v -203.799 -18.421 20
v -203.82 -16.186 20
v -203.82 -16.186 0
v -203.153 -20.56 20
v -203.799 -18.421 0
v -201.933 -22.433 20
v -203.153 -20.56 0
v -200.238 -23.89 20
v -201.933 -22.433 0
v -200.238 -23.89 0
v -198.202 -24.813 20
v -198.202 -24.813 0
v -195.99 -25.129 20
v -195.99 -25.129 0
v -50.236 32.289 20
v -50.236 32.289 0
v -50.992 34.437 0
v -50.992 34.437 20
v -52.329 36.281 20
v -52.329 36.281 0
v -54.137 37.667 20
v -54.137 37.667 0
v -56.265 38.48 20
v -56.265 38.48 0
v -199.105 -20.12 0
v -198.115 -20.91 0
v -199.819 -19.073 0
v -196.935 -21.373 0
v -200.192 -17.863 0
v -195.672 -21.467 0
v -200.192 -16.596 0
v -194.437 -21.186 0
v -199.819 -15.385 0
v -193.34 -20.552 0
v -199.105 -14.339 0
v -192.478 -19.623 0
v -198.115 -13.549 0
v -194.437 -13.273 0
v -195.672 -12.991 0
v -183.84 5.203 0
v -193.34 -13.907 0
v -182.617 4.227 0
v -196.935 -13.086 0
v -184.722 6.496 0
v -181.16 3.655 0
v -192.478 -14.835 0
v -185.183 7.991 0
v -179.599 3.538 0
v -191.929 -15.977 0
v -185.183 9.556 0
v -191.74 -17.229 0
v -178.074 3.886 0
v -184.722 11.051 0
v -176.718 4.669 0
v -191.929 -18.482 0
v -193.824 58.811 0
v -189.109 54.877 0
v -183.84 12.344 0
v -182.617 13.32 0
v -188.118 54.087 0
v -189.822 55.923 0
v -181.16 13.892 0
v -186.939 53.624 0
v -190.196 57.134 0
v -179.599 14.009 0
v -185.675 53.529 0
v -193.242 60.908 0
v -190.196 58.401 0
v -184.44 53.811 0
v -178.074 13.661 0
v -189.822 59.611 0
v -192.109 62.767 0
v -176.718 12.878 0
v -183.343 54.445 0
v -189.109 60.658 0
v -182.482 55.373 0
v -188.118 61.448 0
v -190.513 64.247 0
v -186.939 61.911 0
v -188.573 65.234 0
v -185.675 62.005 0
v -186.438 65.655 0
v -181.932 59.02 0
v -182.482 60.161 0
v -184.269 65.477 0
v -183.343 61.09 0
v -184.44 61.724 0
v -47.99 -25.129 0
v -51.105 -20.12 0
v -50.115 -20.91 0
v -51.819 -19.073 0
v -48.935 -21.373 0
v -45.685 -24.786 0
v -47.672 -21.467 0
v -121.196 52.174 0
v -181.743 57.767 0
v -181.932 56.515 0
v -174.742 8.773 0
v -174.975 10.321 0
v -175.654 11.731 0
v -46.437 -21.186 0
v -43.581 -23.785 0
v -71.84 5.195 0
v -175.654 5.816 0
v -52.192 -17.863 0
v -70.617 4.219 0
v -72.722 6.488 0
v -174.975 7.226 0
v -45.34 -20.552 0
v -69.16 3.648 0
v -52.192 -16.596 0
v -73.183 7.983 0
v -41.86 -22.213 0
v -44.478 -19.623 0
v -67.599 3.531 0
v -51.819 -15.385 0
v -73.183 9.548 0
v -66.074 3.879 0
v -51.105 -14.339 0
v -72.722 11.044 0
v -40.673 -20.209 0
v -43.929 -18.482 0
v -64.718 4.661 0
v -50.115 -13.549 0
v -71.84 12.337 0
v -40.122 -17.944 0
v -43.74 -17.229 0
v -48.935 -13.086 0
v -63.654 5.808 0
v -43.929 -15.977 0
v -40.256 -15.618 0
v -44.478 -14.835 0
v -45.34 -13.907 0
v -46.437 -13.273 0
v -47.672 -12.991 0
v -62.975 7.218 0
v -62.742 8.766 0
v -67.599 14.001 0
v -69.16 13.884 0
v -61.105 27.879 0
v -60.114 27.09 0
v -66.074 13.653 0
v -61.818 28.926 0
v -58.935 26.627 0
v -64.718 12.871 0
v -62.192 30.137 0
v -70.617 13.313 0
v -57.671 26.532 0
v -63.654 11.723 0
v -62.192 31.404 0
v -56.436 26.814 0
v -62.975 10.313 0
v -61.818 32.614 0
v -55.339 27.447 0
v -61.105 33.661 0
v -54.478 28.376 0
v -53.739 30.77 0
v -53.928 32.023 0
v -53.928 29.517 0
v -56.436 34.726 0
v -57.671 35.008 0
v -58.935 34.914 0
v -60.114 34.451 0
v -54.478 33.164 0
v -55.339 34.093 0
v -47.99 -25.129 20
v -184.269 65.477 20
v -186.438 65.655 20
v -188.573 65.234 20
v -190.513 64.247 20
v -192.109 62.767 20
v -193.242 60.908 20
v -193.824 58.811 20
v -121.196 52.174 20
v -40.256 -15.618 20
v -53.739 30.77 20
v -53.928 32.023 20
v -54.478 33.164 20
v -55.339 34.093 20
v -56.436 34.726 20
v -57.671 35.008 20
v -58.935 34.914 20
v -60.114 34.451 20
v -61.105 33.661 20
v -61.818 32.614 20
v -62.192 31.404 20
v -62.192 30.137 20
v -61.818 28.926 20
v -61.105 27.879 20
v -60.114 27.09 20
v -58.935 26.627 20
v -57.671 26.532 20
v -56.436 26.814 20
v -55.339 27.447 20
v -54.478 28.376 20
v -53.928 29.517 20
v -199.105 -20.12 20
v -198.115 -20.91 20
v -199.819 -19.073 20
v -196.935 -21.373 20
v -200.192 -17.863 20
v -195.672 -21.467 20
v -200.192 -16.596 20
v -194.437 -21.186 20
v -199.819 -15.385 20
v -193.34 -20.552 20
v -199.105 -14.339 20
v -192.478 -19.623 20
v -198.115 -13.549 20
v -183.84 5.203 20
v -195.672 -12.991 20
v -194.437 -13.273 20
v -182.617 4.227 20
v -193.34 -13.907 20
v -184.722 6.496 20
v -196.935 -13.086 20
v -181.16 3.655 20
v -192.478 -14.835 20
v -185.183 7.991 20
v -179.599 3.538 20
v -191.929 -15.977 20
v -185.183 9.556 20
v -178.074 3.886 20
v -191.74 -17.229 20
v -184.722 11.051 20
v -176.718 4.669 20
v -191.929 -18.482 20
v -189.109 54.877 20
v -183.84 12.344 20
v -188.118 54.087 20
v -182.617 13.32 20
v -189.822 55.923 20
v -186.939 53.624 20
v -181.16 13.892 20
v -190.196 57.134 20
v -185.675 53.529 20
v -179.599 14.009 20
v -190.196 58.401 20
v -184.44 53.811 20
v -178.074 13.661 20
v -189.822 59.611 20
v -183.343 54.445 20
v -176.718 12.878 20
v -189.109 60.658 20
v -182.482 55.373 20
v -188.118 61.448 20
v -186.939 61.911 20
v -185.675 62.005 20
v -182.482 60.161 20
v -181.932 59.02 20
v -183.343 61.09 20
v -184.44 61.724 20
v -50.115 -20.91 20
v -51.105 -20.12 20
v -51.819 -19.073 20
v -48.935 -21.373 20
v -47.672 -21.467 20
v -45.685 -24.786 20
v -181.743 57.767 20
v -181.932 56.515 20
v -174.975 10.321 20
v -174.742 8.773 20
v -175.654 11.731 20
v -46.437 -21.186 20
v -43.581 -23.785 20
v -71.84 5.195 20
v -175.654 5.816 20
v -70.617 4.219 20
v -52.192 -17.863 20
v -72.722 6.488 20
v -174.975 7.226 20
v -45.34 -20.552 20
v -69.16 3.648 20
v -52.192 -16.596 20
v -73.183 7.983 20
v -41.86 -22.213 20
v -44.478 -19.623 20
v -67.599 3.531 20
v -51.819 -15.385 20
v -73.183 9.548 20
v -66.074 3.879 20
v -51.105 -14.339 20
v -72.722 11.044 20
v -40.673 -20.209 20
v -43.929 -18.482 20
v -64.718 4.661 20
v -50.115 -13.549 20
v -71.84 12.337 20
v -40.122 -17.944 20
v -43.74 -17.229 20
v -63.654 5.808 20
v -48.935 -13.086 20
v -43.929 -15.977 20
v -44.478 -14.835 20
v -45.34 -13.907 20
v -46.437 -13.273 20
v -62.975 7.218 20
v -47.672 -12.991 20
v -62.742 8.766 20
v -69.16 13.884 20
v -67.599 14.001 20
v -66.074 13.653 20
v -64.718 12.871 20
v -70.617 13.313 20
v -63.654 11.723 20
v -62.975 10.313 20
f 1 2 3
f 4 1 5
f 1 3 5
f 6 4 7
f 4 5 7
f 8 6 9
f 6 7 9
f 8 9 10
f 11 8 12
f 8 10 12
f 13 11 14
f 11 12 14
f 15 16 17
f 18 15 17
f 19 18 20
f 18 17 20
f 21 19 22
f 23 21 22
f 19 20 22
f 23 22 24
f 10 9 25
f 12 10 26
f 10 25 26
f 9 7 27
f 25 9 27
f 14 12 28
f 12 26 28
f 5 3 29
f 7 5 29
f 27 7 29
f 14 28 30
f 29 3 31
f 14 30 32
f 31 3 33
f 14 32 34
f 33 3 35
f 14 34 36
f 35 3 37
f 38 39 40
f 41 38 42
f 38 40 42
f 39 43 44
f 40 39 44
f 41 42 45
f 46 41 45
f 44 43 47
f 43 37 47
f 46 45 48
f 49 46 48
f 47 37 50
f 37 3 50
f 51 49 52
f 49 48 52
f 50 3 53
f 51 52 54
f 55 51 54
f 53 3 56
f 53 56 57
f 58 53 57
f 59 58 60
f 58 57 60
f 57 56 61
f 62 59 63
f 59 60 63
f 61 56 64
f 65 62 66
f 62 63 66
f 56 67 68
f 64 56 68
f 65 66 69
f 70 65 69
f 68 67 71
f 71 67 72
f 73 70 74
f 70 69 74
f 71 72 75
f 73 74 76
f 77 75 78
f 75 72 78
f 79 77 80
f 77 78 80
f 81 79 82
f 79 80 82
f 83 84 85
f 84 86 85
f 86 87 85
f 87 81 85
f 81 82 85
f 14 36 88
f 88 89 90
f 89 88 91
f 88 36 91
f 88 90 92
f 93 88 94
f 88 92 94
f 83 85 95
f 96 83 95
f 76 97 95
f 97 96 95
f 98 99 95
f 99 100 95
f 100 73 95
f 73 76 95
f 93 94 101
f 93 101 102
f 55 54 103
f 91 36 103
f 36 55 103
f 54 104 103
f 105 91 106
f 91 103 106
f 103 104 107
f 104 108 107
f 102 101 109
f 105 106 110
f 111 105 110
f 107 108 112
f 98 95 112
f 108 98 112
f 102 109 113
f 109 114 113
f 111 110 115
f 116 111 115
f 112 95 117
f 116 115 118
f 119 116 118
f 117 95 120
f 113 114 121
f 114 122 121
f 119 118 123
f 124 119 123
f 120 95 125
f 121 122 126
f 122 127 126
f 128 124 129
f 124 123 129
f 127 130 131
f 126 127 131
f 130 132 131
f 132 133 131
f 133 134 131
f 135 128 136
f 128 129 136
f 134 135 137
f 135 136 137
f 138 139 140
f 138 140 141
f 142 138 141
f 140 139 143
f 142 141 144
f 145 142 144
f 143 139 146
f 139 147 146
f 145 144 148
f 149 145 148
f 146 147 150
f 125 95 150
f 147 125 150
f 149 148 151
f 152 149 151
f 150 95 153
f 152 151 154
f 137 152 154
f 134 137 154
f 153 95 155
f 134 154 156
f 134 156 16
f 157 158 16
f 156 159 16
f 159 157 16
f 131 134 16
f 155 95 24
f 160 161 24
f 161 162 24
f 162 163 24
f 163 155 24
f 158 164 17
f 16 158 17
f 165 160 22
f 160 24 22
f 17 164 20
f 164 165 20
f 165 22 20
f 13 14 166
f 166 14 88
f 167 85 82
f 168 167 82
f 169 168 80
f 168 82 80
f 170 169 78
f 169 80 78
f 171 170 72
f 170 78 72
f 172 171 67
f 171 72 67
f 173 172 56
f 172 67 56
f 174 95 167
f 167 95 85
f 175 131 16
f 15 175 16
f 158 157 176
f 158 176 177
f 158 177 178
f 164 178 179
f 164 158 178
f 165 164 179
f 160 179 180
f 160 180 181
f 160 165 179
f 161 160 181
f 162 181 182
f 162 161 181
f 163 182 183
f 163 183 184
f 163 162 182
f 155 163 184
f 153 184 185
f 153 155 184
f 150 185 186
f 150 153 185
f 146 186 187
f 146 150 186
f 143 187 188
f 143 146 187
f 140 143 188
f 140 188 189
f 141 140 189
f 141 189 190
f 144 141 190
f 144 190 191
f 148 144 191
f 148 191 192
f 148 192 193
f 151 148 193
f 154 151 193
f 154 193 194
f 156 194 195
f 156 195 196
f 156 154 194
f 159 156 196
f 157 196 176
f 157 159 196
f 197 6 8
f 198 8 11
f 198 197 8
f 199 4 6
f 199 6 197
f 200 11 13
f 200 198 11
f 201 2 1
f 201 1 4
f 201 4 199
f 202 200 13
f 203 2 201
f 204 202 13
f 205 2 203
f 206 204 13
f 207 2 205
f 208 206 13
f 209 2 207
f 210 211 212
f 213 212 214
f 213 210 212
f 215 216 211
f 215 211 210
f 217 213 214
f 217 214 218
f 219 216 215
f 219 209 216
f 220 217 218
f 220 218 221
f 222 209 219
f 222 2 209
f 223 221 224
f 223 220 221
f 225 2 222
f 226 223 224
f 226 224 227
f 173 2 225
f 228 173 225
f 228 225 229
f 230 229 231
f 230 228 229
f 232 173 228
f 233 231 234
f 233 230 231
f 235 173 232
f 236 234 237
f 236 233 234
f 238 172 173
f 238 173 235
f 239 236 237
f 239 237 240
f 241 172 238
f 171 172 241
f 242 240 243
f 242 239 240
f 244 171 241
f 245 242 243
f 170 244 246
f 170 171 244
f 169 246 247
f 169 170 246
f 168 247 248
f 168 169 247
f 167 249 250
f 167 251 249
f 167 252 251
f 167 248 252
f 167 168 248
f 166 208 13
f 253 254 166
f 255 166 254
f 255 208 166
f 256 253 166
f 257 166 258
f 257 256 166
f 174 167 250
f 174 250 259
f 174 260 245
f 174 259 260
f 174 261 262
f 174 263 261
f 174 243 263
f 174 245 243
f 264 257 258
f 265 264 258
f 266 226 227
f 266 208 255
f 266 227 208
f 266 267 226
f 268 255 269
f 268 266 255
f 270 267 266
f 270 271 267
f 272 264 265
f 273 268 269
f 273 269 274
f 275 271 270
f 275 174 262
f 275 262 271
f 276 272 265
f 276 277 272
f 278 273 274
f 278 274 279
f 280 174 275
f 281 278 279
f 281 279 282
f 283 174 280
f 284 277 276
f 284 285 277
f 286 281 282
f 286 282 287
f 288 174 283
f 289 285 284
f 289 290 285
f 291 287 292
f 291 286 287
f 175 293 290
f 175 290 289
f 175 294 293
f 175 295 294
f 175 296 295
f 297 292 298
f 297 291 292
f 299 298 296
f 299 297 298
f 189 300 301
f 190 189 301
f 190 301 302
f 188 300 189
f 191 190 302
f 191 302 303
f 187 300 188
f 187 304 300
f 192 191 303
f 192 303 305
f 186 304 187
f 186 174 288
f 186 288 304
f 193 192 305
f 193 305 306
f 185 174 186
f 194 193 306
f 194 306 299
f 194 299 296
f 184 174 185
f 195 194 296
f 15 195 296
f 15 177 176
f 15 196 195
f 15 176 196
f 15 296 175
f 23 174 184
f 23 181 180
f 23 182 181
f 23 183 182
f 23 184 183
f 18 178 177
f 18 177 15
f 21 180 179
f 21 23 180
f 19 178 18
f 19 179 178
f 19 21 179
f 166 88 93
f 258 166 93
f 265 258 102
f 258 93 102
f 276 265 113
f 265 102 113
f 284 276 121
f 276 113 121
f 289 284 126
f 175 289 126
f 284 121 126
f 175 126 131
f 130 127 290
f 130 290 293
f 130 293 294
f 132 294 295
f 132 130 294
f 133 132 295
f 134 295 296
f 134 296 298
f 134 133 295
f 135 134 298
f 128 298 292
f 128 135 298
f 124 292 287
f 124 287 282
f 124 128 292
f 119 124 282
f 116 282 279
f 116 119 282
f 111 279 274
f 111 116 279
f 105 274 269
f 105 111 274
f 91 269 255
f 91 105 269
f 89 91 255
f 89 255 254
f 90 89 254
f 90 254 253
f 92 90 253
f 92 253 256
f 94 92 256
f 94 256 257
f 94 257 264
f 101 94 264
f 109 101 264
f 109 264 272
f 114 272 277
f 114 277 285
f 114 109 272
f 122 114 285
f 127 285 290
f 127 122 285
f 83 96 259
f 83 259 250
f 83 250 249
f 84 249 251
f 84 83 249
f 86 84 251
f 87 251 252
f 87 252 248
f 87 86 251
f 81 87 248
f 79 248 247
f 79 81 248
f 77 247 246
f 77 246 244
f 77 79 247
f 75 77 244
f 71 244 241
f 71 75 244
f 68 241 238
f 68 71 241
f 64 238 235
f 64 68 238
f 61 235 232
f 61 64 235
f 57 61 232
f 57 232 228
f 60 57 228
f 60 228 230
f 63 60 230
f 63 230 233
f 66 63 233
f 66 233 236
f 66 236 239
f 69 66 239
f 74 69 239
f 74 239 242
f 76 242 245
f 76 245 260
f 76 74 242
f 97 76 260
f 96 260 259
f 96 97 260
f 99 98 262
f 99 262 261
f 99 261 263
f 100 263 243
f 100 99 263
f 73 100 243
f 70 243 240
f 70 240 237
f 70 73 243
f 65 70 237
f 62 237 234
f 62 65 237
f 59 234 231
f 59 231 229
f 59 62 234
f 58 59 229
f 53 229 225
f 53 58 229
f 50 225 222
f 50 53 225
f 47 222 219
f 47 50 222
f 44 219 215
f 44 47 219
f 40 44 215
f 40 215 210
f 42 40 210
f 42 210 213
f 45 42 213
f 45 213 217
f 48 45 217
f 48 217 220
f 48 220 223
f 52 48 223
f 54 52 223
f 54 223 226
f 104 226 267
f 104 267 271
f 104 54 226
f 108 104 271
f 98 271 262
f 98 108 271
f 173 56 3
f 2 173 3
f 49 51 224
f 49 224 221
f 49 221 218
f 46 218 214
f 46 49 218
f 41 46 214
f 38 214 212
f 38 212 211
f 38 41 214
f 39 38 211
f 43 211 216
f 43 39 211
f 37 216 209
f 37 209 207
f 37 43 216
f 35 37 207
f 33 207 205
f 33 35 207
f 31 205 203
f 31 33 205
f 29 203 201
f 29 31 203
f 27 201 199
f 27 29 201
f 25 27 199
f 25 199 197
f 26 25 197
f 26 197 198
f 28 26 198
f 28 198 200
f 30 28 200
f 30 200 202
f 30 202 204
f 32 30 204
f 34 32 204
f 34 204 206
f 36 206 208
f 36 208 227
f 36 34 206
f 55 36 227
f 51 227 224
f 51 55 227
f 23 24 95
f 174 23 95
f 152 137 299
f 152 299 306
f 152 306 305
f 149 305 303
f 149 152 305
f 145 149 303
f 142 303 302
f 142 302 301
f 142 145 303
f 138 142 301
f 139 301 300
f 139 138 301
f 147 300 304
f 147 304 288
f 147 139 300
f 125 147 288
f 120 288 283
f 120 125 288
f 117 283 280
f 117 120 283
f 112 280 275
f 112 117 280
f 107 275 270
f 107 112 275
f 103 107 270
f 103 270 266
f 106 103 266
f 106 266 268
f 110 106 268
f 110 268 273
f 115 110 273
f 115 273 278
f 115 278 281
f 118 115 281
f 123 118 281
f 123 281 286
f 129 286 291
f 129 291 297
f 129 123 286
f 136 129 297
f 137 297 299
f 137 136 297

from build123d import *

# Parameters (mm, degrees)
F0_R     = 4.25
F0_R_2   = 5.25
F1_DEPTH = 20


with BuildPart() as f1:
    # F0 (on Top) → F1 (new body)
    with BuildSketch(Plane.XY):
        with BuildLine():
            Line((-193.823792, 58.811097), (-203.820433, -16.185588))
            ThreePointArc((-203.820433, -16.185588), (-201.933428, -22.43342), (-195.989693, -25.129382))
            Line((-195.989693, -25.129382), (-47.989693, -25.129382))
            ThreePointArc((-47.989693, -25.129382), (-41.860303, -22.213415), (-40.255748, -15.618138))
            Line((-40.255748, -15.618138), (-50.236344, 32.288557))
            ThreePointArc((-50.236344, 32.288557), (-52.328942, 36.281327), (-56.264514, 38.479611))
            Line((-56.264514, 38.479611), (-121.196228, 52.174278))
            Line((-121.196228, 52.174278), (-184.268519, 65.476777))
            ThreePointArc((-184.268519, 65.476777), (-190.512926, 64.246558), (-193.823792, 58.811097))
        make_face()
        with Locations((-195.989693, -17.229382)):
            Circle(F0_R, mode=Mode.SUBTRACT)
        with Locations((-179.991815, 8.77348)):
            Circle(F0_R_2, mode=Mode.SUBTRACT)
        with Locations((-47.989693, -17.229382)):
            Circle(F0_R, mode=Mode.SUBTRACT)
        with Locations((-67.991815, 8.765908)):
            Circle(F0_R_2, mode=Mode.SUBTRACT)
        with Locations((-185.993052, 57.767303)):
            Circle(F0_R, mode=Mode.SUBTRACT)
        with Locations((-57.989047, 30.770137)):
            Circle(F0_R, mode=Mode.SUBTRACT)
    extrude(amount=F1_DEPTH)


solid = f1.part
